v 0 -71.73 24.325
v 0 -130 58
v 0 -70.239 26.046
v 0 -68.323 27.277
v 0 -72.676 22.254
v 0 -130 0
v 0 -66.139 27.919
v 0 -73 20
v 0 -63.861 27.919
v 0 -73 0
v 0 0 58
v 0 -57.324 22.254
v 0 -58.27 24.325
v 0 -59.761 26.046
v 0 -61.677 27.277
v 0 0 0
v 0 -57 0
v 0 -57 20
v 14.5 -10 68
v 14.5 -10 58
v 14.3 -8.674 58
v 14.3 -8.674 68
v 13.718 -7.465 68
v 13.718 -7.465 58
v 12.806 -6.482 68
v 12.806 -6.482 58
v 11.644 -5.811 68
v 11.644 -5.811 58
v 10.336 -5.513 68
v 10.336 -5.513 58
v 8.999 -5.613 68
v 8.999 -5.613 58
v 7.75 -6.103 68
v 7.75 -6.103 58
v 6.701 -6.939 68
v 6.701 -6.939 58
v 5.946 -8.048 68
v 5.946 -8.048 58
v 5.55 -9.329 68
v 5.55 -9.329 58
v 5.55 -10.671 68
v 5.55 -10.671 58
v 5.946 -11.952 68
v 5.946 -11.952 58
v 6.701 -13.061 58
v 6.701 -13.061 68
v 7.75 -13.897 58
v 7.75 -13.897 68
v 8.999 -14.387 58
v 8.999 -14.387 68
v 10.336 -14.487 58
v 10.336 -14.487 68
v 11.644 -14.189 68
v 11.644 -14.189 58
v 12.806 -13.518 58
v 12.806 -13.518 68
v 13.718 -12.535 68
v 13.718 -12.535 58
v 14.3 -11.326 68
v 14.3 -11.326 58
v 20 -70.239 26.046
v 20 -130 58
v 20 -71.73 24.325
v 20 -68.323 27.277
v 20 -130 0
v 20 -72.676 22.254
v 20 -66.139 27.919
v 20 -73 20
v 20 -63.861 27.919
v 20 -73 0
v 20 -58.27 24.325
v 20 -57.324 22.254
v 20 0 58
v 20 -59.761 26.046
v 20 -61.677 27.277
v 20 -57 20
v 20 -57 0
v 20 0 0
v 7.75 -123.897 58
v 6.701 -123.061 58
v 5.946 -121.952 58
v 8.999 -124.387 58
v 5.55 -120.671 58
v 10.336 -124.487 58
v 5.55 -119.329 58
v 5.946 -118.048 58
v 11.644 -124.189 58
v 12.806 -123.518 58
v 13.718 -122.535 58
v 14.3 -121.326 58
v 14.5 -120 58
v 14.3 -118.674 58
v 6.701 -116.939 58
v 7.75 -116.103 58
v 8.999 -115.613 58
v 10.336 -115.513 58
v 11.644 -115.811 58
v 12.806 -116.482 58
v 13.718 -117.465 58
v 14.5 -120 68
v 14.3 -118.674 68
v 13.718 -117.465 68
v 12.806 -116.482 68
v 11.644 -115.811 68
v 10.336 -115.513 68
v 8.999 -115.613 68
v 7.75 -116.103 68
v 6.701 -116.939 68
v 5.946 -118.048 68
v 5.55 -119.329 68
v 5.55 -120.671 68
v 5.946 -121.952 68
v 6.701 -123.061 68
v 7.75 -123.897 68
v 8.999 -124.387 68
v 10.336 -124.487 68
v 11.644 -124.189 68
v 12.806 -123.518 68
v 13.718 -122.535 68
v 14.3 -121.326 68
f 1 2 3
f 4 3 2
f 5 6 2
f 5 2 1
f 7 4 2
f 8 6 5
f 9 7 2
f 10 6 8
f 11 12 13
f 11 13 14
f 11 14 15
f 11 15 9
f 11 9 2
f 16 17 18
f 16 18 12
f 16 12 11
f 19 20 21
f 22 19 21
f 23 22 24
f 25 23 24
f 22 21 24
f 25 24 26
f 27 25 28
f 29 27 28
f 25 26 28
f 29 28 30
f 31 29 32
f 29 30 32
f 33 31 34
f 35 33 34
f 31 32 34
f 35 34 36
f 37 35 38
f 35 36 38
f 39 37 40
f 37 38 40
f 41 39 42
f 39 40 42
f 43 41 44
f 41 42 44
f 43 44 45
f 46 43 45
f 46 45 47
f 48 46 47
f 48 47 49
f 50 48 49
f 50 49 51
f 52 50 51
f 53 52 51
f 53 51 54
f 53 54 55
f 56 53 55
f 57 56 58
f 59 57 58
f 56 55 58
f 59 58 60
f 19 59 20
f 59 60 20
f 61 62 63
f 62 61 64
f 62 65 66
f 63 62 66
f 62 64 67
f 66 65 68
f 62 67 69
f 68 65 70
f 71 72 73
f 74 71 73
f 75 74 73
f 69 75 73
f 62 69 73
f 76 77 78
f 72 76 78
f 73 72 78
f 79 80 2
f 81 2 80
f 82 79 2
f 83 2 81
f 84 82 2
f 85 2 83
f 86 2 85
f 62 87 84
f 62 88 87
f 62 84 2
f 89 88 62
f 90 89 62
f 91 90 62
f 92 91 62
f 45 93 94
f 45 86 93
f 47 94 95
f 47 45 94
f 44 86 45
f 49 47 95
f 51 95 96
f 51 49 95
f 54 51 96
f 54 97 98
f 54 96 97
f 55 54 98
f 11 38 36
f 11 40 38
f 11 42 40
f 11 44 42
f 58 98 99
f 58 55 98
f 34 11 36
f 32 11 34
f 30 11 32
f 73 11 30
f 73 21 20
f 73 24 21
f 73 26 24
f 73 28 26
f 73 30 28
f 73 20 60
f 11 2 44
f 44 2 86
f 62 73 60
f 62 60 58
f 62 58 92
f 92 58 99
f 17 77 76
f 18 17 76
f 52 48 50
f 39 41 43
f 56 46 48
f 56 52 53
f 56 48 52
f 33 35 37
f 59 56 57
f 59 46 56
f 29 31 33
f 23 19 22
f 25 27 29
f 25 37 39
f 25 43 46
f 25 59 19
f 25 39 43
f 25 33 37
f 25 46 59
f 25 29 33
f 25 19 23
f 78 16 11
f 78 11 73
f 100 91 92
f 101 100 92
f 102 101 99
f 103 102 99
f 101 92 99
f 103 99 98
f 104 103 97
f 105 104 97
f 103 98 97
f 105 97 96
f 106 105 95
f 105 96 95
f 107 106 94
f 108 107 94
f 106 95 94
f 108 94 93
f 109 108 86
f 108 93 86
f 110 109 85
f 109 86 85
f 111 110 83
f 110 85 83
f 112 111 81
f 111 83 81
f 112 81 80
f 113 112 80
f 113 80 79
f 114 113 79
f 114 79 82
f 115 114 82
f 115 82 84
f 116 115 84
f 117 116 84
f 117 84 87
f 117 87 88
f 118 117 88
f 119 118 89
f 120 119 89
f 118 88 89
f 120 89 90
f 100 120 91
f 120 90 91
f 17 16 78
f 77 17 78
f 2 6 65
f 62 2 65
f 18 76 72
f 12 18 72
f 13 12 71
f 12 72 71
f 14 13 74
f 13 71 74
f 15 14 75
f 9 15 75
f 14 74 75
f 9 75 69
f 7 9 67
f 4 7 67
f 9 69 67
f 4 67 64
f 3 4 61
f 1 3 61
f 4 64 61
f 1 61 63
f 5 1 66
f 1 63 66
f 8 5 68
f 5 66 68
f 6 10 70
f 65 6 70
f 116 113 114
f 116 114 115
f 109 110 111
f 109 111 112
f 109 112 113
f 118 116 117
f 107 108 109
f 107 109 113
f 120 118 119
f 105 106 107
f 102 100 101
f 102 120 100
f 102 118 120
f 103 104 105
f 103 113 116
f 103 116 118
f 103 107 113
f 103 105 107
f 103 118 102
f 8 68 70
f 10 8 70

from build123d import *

# Parameters (mm, degrees)
F0_W     = 20
F0_H     = 130
F1_DEPTH = 58
F3_DEPTH = 20.001
F4_R     = 4.5
F5_DEPTH = 10


with BuildPart() as f1:
    # F0 (on Top) → F1 (new body)
    with BuildSketch(Plane.XY):
        with Locations((10, -65)):
            Rectangle(F0_W, F0_H)
    extrude(amount=F1_DEPTH)

    # F2 (on face) → F3 (cut, through all)
    with BuildSketch(Plane.YZ.offset(20)):
        with BuildLine():
            Line((-57, 0), (-57, 20))
            ThreePointArc((-57, 20), (-65, 28), (-73, 20))
            Line((-73, 20), (-73, 0))
            Line((-73, 0), (-57, 0))
        make_face()
    extrude(amount=-F3_DEPTH, mode=Mode.SUBTRACT)

    # F4 (on face) → F5 (join)
    with BuildSketch(Plane.XY.offset(58)):
        with Locations((10, -10)):
            Circle(F4_R)
        with Locations((10, -120)):
            Circle(F4_R)
    extrude(amount=F5_DEPTH)


solid = f1.part
